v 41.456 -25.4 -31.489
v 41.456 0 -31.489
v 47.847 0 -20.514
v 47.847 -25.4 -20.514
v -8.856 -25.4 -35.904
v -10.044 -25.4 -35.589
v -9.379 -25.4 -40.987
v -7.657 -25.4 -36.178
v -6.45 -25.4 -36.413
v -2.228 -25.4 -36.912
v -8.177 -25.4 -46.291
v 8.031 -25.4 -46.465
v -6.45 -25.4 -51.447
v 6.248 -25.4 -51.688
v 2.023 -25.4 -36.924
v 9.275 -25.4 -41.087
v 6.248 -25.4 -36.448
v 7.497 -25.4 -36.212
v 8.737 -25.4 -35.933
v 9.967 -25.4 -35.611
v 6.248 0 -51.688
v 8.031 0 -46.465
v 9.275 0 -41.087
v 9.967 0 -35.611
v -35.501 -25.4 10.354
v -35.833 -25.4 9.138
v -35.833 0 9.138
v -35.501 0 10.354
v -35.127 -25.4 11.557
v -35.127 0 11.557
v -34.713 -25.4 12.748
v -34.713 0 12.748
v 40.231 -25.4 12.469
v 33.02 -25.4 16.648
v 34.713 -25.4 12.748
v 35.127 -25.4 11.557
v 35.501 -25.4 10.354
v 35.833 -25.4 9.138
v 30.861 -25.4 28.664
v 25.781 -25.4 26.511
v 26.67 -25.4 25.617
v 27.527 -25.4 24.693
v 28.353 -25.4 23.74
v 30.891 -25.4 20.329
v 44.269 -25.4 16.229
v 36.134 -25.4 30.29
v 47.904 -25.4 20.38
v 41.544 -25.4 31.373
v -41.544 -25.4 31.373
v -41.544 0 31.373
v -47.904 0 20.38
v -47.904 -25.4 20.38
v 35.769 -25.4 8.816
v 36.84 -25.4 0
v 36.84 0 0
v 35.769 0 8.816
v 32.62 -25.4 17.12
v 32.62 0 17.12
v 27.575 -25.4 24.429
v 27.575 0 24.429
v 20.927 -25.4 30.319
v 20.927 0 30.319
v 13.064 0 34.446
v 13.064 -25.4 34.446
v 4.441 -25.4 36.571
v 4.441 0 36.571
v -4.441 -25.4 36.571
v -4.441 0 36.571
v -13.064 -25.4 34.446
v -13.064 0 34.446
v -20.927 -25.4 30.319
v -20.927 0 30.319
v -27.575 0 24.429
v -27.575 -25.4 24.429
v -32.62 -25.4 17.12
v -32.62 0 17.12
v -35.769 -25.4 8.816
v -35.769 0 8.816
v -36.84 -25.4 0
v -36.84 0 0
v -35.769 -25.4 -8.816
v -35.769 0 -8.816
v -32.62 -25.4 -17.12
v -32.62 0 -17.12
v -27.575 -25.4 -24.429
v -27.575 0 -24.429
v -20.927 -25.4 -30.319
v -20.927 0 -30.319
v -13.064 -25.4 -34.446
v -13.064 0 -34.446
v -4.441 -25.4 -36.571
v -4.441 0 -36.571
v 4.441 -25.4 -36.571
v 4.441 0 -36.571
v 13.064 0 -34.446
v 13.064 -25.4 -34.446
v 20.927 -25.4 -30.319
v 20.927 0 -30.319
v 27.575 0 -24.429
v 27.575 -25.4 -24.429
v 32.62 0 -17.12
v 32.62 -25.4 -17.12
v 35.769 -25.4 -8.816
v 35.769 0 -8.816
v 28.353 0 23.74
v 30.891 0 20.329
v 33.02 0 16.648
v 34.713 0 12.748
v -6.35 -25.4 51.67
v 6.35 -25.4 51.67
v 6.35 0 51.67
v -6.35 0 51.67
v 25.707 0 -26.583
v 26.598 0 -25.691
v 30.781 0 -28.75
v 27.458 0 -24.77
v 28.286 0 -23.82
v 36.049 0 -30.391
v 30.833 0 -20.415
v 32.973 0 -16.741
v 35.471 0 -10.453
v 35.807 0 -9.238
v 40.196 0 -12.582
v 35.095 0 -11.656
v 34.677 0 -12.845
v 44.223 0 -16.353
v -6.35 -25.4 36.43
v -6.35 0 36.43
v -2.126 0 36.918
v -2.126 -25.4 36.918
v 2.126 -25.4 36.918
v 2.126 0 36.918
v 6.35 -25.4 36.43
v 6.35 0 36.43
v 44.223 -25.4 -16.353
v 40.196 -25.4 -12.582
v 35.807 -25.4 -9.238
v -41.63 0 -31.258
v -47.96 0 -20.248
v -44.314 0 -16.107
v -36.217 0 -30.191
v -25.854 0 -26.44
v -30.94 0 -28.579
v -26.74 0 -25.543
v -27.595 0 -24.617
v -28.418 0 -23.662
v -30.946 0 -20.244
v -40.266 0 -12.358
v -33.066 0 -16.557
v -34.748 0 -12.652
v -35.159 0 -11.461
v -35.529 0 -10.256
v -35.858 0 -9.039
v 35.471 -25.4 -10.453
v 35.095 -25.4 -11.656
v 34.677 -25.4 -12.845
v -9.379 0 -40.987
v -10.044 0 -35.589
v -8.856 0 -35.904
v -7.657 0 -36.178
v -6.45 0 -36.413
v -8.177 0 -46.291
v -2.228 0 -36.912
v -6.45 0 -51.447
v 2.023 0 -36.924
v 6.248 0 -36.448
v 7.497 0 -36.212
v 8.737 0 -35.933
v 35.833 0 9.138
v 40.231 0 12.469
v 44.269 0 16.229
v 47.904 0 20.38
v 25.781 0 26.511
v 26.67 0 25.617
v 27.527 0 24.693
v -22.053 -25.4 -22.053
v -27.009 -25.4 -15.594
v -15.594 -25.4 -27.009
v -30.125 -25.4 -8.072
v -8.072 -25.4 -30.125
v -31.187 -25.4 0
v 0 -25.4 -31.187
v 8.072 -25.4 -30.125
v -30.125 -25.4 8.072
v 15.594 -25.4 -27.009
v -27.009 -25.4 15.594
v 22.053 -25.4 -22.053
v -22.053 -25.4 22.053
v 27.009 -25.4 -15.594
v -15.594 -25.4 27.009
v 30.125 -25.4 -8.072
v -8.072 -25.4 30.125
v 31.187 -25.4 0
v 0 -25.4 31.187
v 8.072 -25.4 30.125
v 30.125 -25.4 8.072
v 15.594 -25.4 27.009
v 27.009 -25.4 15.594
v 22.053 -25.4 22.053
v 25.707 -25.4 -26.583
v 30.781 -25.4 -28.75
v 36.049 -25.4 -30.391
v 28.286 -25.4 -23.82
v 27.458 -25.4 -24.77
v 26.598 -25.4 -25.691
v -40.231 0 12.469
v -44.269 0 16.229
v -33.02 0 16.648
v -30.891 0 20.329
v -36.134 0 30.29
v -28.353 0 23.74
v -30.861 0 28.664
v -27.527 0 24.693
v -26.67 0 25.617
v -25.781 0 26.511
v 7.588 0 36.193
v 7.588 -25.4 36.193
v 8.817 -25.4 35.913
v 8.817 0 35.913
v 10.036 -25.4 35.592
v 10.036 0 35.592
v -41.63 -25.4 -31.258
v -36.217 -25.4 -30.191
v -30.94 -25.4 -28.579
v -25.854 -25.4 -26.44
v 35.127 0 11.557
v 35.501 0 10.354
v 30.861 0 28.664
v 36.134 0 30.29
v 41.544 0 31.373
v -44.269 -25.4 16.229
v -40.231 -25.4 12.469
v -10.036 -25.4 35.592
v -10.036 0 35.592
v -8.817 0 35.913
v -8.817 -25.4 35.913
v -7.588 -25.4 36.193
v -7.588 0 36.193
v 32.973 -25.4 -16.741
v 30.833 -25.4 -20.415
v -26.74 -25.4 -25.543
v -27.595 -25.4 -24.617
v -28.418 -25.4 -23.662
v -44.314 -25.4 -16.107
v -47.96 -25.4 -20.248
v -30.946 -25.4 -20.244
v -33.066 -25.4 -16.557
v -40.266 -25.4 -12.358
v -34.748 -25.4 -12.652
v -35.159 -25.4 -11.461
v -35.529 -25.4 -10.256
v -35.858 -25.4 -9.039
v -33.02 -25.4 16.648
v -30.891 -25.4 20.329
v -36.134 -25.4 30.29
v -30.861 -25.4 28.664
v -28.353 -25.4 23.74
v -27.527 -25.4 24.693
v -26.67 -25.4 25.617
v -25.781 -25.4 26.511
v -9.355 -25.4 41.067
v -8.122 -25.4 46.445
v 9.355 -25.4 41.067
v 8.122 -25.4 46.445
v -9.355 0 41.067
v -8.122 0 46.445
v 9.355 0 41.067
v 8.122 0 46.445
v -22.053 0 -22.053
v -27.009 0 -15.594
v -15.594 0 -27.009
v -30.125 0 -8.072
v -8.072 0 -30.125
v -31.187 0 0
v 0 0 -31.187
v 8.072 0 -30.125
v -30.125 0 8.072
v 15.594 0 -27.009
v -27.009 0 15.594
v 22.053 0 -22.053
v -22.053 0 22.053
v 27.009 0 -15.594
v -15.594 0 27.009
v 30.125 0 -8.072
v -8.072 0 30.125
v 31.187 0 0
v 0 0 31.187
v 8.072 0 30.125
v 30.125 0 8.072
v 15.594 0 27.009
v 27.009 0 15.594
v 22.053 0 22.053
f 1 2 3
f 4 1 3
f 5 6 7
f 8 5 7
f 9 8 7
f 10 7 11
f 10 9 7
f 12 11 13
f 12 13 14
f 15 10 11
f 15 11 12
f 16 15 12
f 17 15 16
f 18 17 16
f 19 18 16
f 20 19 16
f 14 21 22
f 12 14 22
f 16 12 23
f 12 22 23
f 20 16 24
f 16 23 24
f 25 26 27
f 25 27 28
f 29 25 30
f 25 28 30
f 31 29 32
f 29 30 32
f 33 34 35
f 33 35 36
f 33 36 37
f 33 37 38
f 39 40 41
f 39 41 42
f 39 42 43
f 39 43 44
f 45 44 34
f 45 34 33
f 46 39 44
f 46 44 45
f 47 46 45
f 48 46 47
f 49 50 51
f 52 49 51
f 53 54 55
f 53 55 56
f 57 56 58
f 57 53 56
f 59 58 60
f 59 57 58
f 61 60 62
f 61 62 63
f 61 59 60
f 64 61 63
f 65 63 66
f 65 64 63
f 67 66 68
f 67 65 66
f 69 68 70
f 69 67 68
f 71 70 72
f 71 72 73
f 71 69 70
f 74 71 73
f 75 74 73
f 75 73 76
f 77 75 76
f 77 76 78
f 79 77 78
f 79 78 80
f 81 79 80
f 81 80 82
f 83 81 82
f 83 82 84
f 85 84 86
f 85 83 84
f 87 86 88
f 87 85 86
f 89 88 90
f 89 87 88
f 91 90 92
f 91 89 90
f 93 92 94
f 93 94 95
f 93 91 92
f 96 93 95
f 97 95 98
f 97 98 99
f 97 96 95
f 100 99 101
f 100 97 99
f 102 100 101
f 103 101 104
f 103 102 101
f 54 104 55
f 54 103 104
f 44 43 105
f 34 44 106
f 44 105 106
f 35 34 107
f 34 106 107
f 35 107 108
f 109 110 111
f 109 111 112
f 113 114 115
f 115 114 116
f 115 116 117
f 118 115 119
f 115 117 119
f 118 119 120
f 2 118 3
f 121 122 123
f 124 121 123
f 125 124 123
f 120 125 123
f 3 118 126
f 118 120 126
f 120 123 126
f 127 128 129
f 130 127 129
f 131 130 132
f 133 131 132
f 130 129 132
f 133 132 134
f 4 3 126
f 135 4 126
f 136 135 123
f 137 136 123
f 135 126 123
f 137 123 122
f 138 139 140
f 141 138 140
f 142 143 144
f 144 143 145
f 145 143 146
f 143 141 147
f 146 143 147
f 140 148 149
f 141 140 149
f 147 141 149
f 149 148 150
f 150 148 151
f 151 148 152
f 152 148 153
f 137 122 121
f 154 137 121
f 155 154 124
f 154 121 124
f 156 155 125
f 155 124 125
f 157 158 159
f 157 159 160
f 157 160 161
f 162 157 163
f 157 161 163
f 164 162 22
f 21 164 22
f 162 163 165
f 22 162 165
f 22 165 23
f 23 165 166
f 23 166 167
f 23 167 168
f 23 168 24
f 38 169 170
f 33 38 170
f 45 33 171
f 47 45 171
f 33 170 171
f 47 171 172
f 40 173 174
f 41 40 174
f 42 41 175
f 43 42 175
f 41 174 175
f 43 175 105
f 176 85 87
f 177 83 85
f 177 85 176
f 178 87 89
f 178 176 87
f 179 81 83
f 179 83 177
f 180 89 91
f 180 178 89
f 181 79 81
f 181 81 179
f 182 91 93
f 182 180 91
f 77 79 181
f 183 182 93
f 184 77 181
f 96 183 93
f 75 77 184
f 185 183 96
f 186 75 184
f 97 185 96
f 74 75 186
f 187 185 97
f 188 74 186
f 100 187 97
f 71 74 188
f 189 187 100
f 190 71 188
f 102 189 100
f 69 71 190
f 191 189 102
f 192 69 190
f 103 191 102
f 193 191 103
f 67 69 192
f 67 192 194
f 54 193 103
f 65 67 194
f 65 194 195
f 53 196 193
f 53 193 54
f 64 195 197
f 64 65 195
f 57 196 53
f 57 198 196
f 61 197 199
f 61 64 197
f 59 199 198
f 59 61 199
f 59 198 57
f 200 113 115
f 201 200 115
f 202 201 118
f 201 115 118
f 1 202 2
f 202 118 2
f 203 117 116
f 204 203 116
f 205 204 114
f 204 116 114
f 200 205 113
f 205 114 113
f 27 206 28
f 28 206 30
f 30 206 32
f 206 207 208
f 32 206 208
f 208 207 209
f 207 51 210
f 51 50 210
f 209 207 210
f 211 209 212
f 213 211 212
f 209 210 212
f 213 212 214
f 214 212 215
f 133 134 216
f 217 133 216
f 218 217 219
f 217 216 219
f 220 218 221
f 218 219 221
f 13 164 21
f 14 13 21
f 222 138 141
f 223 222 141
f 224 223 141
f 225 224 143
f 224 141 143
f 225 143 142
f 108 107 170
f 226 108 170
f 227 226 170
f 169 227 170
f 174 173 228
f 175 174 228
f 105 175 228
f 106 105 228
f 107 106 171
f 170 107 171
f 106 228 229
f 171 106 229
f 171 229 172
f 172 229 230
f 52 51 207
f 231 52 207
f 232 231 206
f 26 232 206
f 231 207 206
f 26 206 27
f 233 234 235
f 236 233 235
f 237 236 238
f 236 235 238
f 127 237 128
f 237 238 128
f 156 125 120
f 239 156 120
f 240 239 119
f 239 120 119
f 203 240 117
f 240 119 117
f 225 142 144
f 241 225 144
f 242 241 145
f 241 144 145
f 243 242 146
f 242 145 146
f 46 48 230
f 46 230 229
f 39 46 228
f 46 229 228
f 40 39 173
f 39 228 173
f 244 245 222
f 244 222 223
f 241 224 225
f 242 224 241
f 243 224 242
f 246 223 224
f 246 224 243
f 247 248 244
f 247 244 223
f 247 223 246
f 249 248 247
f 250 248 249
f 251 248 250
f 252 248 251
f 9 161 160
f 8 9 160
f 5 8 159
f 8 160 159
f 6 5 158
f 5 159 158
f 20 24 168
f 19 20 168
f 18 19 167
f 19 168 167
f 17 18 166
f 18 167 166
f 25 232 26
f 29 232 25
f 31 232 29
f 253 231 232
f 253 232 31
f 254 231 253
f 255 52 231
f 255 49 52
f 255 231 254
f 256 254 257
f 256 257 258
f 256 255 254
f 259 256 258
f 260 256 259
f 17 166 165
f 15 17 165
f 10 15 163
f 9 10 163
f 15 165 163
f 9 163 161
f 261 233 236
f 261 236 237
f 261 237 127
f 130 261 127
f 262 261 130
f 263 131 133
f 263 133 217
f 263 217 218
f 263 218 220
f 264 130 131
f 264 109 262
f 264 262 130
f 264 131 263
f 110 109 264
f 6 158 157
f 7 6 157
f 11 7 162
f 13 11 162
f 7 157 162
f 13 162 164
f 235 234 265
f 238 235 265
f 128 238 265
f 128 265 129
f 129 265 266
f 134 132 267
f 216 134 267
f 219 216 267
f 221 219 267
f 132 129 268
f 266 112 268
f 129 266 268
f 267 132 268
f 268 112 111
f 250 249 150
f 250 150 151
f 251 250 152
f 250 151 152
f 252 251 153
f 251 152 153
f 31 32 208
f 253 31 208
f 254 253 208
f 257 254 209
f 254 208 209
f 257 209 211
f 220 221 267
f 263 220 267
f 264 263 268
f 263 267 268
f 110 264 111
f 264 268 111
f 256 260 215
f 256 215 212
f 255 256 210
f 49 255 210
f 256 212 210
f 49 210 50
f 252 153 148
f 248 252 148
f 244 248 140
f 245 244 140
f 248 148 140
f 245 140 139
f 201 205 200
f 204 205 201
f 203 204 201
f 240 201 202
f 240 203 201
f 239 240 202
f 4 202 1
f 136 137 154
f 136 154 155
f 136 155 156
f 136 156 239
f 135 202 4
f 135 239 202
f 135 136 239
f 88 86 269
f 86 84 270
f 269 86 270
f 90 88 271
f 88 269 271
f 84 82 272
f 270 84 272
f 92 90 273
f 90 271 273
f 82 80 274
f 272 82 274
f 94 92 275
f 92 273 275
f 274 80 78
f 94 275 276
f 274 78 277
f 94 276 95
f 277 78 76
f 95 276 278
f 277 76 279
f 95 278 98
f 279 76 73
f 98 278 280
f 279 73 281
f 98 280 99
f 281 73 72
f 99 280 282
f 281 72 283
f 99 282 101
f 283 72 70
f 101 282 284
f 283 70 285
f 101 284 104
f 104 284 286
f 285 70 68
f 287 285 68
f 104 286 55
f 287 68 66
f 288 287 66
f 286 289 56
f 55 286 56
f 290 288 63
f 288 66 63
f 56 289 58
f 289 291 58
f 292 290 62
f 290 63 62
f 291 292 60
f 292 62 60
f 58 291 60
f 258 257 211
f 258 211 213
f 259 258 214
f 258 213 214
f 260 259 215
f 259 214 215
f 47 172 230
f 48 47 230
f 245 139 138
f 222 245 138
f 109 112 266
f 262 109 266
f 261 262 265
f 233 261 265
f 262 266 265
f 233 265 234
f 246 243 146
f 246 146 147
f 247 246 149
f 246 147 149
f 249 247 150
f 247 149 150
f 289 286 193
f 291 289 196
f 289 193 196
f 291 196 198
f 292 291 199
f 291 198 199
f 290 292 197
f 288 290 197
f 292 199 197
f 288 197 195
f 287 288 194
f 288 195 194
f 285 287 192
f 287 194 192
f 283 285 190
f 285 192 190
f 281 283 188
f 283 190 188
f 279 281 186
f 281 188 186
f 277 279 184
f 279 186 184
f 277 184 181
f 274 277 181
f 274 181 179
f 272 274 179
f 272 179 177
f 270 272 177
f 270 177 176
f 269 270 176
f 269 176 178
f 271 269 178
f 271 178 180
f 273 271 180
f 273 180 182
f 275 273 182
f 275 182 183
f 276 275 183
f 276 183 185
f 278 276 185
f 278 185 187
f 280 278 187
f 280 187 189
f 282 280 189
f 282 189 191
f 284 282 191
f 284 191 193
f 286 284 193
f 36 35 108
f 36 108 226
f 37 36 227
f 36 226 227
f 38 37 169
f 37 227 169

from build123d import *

# Parameters (mm, degrees)
F1_DEPTH = 25.4
F2_R     = 36.839907
F3_DEPTH = 25.4
F4_R     = 31.187406
F5_DEPTH = 44.704


with BuildPart() as f1:
    # F0 (on Front) → F1 (new body)
    with BuildSketch(Plane.XZ):
        with BuildLine():
            ThreePointArc((-10.035525, 35.591856), (-8.203482, 36.058215), (-6.35, 36.430338))
            Line((-6.35, 36.430338), (-6.35, 51.670338))
            ThreePointArc((-6.35, 51.670338), (-8.807128, 43.771922), (-10.035525, 35.591856))
        make_face()
        with BuildLine():
            ThreePointArc((-6.35, 36.430338), (0, 36.979616), (6.35, 36.430338))
            Line((6.35, 36.430338), (6.35, 51.670338))
            Line((6.35, 51.670338), (-6.35, 51.670338))
            Line((-6.35, 51.670338), (-6.35, 36.430338))
        make_face()
        with BuildLine():
            ThreePointArc((6.35, 36.430338), (8.203482, 36.058215), (10.035524, 35.591856))
            ThreePointArc((10.035524, 35.591856), (8.807127, 43.771922), (6.35, 51.670338))
            Line((6.35, 51.670338), (6.35, 36.430338))
        make_face()
        with BuildLine():
            ThreePointArc((25.781413, 26.510577), (27.102552, 25.158371), (28.35286, 23.740415))
            Line((28.35286, 23.740415), (41.544101, 31.372503))
            ThreePointArc((41.544101, 31.372503), (33.476981, 29.543839), (25.781413, 26.510577))
        make_face()
        with BuildLine():
            ThreePointArc((28.35286, 23.740415), (32.008334, 18.519139), (34.712934, 12.747714))
            Line((34.712934, 12.747714), (47.904174, 20.379802))
            Line((47.904174, 20.379802), (41.544101, 31.372503))
            Line((41.544101, 31.372503), (28.35286, 23.740415))
        make_face()
        with BuildLine():
            Line((47.904174, 20.379802), (34.712934, 12.747714))
            ThreePointArc((34.712934, 12.747714), (35.319048, 10.957045), (35.832858, 9.13774))
            ThreePointArc((35.832858, 9.13774), (42.29808, 14.297522), (47.904174, 20.379802))
        make_face()
        with BuildLine():
            ThreePointArc((47.84674, -20.514281), (42.257752, -14.416277), (35.807049, -9.238356))
            ThreePointArc((35.807049, -9.238356), (35.288131, -11.05621), (34.67699, -12.84517))
            Line((34.67699, -12.84517), (47.84674, -20.514281))
        make_face()
        with BuildLine():
            Line((47.84674, -20.514281), (34.67699, -12.84517))
            ThreePointArc((34.67699, -12.84517), (31.956189, -18.608975), (28.286064, -23.819962))
            Line((28.286064, -23.819962), (41.455815, -31.489073))
            Line((41.455815, -31.489073), (47.84674, -20.514281))
        make_face()
        with BuildLine():
            Line((41.455815, -31.489073), (28.286064, -23.819962))
            ThreePointArc((28.286064, -23.819962), (27.031778, -25.234401), (25.706846, -26.582891))
            ThreePointArc((25.706846, -26.582891), (33.393863, -29.637756), (41.455815, -31.489073))
        make_face()
        with BuildLine():
            ThreePointArc((6.247645, -51.68803), (8.721601, -43.791786), (9.966517, -35.611242))
            ThreePointArc((9.966517, -35.611242), (8.11787, -36.077585), (6.247645, -36.44803))
            Line((6.247645, -36.44803), (6.247645, -51.68803))
        make_face()
        with BuildLine():
            ThreePointArc((-6.450075, -36.412752), (-8.257493, -36.045885), (-10.044373, -35.58936))
            ThreePointArc((-10.044373, -35.58936), (-8.844429, -43.653756), (-6.450075, -51.447434))
            Line((-6.450075, -51.447434), (-6.450075, -36.412752))
        make_face()
        with BuildLine():
            Line((6.247645, -51.68803), (6.247645, -36.44803))
            ThreePointArc((6.247645, -36.44803), (-0.102741, -36.979473), (-6.450075, -36.412752))
            Line((-6.450075, -36.412752), (-6.450075, -51.447434))
            Line((-6.450075, -51.447434), (6.247645, -51.68803))
        make_face()
        with BuildLine():
            ThreePointArc((-34.74783, -12.652286), (-35.349021, -10.859958), (-35.85783, -9.039248))
            ThreePointArc((-35.85783, -9.039248), (-42.337205, -14.181245), (-47.959991, -20.248099))
            Line((-47.959991, -20.248099), (-34.74783, -12.652286))
        make_face()
        with BuildLine():
            ThreePointArc((-41.630146, -31.258234), (-33.558032, -29.451743), (-25.854159, -26.439638))
            ThreePointArc((-25.854159, -26.439638), (-27.171578, -25.083807), (-28.417985, -23.66242))
            Line((-28.417985, -23.66242), (-41.630146, -31.258234))
        make_face()
        with BuildLine():
            ThreePointArc((-28.417985, -23.66242), (-32.059098, -18.43112), (-34.74783, -12.652286))
            Line((-34.74783, -12.652286), (-47.959991, -20.248099))
            Line((-47.959991, -20.248099), (-41.630146, -31.258234))
            Line((-41.630146, -31.258234), (-28.417985, -23.66242))
        make_face()
        with BuildLine():
            ThreePointArc((-47.904174, 20.379802), (-42.29808, 14.297522), (-35.832858, 9.13774))
            ThreePointArc((-35.832858, 9.13774), (-35.319048, 10.957045), (-34.712934, 12.747714))
            Line((-34.712934, 12.747714), (-47.904174, 20.379802))
        make_face()
        with BuildLine():
            ThreePointArc((-28.35286, 23.740415), (-27.102552, 25.158371), (-25.781413, 26.510577))
            ThreePointArc((-25.781413, 26.510577), (-33.476981, 29.543839), (-41.544101, 31.372503))
            Line((-41.544101, 31.372503), (-28.35286, 23.740415))
        make_face()
        with BuildLine():
            ThreePointArc((-34.712934, 12.747714), (-32.008334, 18.519139), (-28.35286, 23.740415))
            Line((-28.35286, 23.740415), (-41.544101, 31.372503))
            Line((-41.544101, 31.372503), (-47.904174, 20.379802))
            Line((-47.904174, 20.379802), (-34.712934, 12.747714))
        make_face()
    extrude(amount=F1_DEPTH)


with BuildPart() as f3:
    # F2 (on face) → F3 (new body)
    with BuildSketch(Plane.XZ.offset(25.4)):
        Circle(F2_R)
    extrude(amount=-F3_DEPTH)

    # F4 (on face) → F5 (cut)
    with BuildSketch(Plane.XZ.offset(25.4)):
        Circle(F4_R)
    extrude(amount=-F5_DEPTH, mode=Mode.SUBTRACT)


solid = Compound([f1.part, f3.part])
